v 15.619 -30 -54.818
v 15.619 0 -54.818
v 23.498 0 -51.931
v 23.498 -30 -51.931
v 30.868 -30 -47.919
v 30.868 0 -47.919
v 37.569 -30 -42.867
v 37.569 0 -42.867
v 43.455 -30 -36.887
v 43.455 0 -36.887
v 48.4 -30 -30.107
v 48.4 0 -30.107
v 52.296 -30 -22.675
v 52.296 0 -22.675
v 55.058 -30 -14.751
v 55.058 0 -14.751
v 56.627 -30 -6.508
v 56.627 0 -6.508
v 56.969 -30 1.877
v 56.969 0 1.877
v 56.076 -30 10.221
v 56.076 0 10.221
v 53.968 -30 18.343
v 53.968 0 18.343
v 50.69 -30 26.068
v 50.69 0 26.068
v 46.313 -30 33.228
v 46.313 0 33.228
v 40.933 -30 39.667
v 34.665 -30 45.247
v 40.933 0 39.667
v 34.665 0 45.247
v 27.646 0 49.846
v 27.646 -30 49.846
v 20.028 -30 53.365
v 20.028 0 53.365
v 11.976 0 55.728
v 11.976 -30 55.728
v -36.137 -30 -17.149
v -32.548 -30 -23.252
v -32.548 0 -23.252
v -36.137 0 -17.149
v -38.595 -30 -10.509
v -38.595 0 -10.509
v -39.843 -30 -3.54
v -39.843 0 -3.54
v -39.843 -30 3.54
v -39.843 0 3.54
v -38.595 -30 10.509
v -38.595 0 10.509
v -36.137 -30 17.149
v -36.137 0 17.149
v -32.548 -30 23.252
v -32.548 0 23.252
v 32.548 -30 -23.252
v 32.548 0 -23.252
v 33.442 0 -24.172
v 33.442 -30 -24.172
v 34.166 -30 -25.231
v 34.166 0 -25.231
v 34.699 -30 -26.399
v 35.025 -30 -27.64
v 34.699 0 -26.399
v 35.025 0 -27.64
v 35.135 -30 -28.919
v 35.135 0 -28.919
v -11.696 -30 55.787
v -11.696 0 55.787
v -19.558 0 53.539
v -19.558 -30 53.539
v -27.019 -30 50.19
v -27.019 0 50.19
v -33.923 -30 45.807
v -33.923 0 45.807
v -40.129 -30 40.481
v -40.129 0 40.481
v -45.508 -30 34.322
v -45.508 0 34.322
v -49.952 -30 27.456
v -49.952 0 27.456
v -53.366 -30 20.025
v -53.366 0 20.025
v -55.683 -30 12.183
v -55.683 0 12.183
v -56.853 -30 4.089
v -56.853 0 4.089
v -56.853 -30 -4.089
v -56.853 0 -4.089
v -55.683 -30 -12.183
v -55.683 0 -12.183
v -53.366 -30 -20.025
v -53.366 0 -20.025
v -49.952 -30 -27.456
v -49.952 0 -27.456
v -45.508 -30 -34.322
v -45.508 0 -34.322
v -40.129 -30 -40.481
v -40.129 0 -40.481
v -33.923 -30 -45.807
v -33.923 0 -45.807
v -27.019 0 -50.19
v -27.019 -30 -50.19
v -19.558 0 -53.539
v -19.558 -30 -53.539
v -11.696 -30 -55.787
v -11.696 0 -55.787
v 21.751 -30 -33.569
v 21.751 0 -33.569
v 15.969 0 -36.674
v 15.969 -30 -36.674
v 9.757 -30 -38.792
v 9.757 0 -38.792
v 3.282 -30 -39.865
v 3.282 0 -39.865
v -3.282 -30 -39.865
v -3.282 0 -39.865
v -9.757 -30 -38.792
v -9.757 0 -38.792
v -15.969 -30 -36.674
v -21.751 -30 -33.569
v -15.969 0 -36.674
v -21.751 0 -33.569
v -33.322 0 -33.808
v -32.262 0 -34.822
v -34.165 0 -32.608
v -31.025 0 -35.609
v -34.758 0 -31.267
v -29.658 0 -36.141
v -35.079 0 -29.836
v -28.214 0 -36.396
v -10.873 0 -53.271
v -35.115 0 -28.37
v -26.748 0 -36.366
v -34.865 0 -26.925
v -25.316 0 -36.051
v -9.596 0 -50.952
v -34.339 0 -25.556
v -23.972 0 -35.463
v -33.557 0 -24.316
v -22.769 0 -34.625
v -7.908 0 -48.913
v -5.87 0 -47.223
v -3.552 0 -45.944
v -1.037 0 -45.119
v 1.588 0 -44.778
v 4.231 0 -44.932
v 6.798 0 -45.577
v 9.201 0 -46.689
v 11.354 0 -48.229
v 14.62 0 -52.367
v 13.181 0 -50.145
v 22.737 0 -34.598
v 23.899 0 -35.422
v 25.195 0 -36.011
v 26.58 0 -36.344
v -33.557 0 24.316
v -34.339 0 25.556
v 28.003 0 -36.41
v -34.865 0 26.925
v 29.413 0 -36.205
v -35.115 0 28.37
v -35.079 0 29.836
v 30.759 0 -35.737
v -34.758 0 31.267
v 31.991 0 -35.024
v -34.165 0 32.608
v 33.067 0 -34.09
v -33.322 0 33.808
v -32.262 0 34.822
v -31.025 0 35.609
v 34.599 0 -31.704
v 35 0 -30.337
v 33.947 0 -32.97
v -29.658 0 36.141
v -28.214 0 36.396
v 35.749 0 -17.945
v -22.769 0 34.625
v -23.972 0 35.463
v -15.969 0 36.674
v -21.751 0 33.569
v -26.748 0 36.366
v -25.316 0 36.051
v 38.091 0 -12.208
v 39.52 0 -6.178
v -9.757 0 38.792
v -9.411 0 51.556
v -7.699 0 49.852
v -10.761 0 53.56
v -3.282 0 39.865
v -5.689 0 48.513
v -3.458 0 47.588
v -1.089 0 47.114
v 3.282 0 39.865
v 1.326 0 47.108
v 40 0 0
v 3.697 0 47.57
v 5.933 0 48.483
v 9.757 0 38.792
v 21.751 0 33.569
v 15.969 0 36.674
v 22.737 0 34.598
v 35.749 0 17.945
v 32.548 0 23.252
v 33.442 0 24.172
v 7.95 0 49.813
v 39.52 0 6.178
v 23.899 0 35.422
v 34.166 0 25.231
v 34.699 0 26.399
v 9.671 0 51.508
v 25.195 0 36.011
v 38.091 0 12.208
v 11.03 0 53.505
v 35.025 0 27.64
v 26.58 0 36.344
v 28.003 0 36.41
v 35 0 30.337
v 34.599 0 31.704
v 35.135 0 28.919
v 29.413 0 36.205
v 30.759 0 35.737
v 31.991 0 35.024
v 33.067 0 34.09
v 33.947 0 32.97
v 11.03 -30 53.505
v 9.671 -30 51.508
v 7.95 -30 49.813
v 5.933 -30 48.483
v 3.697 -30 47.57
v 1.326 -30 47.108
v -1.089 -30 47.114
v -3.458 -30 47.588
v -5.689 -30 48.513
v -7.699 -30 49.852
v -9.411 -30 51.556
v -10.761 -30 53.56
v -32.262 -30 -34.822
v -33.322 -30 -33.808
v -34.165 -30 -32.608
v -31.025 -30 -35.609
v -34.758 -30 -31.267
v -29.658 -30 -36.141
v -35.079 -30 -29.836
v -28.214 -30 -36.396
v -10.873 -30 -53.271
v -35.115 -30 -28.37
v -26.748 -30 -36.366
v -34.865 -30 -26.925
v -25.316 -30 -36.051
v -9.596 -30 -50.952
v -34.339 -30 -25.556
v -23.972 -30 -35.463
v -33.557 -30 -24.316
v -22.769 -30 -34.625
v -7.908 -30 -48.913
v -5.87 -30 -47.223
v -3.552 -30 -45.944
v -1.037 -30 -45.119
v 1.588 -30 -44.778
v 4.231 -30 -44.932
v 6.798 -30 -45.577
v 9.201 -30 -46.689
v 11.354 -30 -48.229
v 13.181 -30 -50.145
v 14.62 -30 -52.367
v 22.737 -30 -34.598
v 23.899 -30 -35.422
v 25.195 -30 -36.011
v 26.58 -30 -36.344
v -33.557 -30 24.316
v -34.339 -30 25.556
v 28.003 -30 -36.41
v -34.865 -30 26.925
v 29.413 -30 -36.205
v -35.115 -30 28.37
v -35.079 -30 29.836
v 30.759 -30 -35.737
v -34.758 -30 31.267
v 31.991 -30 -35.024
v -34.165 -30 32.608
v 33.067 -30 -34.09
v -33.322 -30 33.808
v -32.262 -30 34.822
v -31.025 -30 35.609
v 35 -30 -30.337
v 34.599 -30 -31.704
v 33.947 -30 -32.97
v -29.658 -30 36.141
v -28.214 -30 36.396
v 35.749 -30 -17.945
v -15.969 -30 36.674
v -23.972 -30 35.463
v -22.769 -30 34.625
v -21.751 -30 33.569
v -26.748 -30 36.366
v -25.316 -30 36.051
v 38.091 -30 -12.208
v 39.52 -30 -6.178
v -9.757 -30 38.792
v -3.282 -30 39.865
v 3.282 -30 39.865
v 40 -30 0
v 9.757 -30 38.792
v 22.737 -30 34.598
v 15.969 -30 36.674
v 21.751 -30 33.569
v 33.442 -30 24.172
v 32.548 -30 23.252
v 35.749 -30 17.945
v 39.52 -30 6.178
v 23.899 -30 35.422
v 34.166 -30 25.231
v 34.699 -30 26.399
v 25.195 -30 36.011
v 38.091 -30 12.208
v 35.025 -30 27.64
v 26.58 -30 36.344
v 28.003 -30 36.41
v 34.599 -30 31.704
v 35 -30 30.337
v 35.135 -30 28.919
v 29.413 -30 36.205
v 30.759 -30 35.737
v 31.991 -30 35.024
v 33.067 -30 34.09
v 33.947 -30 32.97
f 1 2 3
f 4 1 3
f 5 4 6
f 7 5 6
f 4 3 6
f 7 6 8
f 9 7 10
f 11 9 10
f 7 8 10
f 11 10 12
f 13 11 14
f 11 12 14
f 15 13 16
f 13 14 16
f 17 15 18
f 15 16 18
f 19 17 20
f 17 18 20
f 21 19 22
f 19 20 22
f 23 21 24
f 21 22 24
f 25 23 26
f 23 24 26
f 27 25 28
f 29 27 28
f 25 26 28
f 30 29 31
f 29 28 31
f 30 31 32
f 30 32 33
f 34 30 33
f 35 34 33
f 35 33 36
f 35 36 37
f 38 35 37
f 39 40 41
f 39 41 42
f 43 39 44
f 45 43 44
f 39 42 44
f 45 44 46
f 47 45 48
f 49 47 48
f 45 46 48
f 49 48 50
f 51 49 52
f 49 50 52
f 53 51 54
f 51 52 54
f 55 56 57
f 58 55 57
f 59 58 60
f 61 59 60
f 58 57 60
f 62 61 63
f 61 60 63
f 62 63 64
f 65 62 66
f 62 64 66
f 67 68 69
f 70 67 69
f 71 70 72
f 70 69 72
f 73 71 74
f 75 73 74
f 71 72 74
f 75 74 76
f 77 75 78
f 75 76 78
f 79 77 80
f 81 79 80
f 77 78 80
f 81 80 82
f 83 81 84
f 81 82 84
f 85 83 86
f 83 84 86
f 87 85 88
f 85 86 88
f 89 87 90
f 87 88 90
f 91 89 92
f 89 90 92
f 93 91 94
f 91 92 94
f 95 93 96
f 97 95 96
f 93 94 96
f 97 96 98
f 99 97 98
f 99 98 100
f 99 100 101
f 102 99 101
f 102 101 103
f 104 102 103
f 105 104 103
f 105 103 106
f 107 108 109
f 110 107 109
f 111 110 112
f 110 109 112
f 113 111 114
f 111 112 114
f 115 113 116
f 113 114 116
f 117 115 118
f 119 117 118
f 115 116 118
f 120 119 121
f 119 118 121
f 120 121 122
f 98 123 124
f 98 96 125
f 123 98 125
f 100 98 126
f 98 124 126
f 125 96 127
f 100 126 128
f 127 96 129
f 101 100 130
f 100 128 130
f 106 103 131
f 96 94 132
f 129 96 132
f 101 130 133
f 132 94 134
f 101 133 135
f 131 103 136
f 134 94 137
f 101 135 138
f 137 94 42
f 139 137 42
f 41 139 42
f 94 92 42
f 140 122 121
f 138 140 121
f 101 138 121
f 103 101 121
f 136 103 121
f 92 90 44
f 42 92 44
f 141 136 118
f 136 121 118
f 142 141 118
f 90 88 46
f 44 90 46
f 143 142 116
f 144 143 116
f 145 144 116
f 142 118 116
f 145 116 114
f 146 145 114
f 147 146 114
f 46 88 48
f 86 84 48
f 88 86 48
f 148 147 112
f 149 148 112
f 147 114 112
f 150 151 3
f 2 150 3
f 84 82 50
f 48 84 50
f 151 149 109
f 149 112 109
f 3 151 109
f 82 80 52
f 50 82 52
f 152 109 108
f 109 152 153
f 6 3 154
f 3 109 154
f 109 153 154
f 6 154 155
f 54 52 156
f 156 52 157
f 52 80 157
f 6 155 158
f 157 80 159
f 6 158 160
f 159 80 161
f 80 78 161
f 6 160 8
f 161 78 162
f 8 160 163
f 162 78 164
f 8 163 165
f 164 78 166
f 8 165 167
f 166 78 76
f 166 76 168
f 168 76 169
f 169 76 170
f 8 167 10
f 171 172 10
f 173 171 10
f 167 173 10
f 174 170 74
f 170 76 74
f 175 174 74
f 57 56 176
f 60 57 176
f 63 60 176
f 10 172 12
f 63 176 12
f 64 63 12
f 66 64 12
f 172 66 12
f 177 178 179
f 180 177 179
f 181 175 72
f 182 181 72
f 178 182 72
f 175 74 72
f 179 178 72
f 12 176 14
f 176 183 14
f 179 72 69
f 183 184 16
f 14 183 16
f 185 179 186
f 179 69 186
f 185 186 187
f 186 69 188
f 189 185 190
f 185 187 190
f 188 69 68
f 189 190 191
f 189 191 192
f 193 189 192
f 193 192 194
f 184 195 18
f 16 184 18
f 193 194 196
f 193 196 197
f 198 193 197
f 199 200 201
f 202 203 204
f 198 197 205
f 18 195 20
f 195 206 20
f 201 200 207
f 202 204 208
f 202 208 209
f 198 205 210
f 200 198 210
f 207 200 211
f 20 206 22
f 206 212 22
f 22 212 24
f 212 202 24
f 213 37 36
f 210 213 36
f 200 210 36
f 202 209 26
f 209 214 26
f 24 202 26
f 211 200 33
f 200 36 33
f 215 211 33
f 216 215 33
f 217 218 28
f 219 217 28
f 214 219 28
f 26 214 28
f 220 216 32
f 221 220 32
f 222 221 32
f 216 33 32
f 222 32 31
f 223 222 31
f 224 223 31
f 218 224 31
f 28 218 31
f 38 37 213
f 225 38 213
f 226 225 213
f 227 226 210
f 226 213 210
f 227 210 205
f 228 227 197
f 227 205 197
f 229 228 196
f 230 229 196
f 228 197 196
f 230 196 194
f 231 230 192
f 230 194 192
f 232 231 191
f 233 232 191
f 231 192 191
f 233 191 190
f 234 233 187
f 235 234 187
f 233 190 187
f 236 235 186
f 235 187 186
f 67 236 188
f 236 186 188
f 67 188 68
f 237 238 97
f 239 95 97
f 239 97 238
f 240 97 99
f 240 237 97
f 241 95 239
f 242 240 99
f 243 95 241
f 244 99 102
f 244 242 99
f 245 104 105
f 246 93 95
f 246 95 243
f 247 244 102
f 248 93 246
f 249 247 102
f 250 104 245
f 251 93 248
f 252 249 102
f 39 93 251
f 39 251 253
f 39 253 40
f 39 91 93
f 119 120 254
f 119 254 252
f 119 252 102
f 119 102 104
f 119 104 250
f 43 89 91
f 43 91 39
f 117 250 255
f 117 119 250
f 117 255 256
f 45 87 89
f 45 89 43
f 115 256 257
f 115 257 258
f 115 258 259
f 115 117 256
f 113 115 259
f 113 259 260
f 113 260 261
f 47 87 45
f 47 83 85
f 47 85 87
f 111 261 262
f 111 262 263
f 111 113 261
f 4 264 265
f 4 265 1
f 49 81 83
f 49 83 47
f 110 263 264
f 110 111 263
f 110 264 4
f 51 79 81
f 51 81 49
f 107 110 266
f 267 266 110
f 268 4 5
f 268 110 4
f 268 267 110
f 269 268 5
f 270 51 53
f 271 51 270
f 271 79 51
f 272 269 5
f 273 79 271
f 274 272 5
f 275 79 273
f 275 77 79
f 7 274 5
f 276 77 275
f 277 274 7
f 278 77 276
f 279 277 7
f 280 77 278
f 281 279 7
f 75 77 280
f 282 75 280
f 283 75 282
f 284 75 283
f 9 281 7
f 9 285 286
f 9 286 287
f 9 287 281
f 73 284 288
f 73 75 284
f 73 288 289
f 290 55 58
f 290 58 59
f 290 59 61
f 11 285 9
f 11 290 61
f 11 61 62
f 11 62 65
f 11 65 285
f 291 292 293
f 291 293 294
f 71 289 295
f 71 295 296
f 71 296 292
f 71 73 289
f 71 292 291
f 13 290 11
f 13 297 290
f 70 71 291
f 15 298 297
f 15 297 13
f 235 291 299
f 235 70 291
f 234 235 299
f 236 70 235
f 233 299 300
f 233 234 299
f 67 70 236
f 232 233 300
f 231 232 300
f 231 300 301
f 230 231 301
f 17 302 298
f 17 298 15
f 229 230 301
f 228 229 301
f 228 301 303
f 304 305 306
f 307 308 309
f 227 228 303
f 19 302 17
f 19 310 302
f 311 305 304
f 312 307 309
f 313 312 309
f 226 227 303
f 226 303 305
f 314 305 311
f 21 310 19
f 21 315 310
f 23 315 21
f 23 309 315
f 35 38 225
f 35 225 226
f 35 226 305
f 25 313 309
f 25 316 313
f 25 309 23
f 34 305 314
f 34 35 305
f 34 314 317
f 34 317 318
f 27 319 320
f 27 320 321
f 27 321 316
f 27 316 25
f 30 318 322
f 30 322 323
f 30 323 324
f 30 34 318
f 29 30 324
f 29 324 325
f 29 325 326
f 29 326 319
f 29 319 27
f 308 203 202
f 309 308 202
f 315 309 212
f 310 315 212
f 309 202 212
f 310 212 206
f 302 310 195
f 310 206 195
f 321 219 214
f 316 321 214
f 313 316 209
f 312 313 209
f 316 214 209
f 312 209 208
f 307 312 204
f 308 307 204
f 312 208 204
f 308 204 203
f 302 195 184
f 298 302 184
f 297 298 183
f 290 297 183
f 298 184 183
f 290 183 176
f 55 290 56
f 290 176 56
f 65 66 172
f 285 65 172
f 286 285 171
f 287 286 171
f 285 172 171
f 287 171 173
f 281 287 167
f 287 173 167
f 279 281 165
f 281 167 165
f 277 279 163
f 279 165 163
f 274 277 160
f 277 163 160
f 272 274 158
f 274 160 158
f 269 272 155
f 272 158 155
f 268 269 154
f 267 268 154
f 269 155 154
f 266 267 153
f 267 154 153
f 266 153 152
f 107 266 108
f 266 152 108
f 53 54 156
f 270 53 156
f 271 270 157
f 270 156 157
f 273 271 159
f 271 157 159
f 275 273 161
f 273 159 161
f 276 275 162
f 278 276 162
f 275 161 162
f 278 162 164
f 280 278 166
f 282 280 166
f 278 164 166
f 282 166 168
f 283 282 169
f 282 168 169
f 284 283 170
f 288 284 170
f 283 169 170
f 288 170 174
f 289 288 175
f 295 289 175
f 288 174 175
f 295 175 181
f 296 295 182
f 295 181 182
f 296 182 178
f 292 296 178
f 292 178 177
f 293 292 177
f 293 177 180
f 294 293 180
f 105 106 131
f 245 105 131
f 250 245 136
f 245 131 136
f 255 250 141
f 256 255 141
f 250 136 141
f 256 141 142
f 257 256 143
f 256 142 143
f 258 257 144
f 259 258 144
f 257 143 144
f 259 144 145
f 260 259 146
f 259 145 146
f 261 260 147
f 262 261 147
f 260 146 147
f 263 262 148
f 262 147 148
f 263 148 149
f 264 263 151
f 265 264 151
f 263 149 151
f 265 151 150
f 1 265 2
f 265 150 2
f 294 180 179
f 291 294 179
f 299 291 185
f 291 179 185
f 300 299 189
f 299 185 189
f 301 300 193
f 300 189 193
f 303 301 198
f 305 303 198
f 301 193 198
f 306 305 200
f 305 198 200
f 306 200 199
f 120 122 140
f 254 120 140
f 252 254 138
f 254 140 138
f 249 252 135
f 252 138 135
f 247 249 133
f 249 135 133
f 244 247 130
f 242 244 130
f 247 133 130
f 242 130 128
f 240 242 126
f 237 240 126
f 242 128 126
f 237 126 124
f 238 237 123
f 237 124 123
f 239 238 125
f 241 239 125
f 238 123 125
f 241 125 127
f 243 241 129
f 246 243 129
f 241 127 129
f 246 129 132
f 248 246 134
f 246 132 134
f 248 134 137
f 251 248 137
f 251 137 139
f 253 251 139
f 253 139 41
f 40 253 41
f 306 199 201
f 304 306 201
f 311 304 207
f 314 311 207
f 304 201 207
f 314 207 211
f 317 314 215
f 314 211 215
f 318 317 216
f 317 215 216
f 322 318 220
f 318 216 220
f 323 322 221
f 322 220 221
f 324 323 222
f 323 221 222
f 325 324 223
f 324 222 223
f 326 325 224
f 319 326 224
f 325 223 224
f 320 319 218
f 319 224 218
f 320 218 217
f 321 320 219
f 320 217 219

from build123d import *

# Parameters (mm, degrees)
F1_DEPTH = 30


with BuildPart() as f1:
    # F0 (on Front) → F1 (new body)
    with BuildSketch(Plane.XZ):
        with BuildLine():
            ThreePointArc((11.976271, 55.727632), (0.118423, 47.051717), (-11.695602, 55.787211))
            ThreePointArc((-11.695602, 55.787211), (-57, 0), (-11.695602, -55.787211))
            ThreePointArc((-11.695602, -55.787211), (1.58817, -44.777874), (15.618535, -54.81844))
            ThreePointArc((15.618535, -54.81844), (56.969087, 1.877013), (11.976271, 55.727632))
        make_face()
        with BuildLine():
            ThreePointArc((32.547889, 23.251558), (38.09144, 12.208285), (40, 0))
            ThreePointArc((40, 0), (38.09144, -12.208285), (32.547889, -23.251558))
            ThreePointArc((32.547889, -23.251558), (34.457846, -25.803765), (35.135292, -28.91869))
            ThreePointArc((35.135292, -28.91869), (30.096884, -36.00322), (21.751142, -33.56915))
            ThreePointArc((21.751142, -33.56915), (0, -40), (-21.751142, -33.56915))
            ThreePointArc((-21.751142, -33.56915), (-32.816909, -34.340945), (-32.547889, -23.251558))
            ThreePointArc((-32.547889, -23.251558), (-40, 0), (-32.547889, 23.251558))
            ThreePointArc((-32.547889, 23.251558), (-32.816909, 34.340945), (-21.751142, 33.56915))
            ThreePointArc((-21.751142, 33.56915), (0, 40), (21.751142, 33.56915))
            ThreePointArc((21.751142, 33.56915), (30.096884, 36.00322), (35.135292, 28.91869))
            ThreePointArc((35.135292, 28.91869), (34.457846, 25.803765), (32.547889, 23.251558))
        make_face(mode=Mode.SUBTRACT)
    extrude(amount=F1_DEPTH)


solid = f1.part
